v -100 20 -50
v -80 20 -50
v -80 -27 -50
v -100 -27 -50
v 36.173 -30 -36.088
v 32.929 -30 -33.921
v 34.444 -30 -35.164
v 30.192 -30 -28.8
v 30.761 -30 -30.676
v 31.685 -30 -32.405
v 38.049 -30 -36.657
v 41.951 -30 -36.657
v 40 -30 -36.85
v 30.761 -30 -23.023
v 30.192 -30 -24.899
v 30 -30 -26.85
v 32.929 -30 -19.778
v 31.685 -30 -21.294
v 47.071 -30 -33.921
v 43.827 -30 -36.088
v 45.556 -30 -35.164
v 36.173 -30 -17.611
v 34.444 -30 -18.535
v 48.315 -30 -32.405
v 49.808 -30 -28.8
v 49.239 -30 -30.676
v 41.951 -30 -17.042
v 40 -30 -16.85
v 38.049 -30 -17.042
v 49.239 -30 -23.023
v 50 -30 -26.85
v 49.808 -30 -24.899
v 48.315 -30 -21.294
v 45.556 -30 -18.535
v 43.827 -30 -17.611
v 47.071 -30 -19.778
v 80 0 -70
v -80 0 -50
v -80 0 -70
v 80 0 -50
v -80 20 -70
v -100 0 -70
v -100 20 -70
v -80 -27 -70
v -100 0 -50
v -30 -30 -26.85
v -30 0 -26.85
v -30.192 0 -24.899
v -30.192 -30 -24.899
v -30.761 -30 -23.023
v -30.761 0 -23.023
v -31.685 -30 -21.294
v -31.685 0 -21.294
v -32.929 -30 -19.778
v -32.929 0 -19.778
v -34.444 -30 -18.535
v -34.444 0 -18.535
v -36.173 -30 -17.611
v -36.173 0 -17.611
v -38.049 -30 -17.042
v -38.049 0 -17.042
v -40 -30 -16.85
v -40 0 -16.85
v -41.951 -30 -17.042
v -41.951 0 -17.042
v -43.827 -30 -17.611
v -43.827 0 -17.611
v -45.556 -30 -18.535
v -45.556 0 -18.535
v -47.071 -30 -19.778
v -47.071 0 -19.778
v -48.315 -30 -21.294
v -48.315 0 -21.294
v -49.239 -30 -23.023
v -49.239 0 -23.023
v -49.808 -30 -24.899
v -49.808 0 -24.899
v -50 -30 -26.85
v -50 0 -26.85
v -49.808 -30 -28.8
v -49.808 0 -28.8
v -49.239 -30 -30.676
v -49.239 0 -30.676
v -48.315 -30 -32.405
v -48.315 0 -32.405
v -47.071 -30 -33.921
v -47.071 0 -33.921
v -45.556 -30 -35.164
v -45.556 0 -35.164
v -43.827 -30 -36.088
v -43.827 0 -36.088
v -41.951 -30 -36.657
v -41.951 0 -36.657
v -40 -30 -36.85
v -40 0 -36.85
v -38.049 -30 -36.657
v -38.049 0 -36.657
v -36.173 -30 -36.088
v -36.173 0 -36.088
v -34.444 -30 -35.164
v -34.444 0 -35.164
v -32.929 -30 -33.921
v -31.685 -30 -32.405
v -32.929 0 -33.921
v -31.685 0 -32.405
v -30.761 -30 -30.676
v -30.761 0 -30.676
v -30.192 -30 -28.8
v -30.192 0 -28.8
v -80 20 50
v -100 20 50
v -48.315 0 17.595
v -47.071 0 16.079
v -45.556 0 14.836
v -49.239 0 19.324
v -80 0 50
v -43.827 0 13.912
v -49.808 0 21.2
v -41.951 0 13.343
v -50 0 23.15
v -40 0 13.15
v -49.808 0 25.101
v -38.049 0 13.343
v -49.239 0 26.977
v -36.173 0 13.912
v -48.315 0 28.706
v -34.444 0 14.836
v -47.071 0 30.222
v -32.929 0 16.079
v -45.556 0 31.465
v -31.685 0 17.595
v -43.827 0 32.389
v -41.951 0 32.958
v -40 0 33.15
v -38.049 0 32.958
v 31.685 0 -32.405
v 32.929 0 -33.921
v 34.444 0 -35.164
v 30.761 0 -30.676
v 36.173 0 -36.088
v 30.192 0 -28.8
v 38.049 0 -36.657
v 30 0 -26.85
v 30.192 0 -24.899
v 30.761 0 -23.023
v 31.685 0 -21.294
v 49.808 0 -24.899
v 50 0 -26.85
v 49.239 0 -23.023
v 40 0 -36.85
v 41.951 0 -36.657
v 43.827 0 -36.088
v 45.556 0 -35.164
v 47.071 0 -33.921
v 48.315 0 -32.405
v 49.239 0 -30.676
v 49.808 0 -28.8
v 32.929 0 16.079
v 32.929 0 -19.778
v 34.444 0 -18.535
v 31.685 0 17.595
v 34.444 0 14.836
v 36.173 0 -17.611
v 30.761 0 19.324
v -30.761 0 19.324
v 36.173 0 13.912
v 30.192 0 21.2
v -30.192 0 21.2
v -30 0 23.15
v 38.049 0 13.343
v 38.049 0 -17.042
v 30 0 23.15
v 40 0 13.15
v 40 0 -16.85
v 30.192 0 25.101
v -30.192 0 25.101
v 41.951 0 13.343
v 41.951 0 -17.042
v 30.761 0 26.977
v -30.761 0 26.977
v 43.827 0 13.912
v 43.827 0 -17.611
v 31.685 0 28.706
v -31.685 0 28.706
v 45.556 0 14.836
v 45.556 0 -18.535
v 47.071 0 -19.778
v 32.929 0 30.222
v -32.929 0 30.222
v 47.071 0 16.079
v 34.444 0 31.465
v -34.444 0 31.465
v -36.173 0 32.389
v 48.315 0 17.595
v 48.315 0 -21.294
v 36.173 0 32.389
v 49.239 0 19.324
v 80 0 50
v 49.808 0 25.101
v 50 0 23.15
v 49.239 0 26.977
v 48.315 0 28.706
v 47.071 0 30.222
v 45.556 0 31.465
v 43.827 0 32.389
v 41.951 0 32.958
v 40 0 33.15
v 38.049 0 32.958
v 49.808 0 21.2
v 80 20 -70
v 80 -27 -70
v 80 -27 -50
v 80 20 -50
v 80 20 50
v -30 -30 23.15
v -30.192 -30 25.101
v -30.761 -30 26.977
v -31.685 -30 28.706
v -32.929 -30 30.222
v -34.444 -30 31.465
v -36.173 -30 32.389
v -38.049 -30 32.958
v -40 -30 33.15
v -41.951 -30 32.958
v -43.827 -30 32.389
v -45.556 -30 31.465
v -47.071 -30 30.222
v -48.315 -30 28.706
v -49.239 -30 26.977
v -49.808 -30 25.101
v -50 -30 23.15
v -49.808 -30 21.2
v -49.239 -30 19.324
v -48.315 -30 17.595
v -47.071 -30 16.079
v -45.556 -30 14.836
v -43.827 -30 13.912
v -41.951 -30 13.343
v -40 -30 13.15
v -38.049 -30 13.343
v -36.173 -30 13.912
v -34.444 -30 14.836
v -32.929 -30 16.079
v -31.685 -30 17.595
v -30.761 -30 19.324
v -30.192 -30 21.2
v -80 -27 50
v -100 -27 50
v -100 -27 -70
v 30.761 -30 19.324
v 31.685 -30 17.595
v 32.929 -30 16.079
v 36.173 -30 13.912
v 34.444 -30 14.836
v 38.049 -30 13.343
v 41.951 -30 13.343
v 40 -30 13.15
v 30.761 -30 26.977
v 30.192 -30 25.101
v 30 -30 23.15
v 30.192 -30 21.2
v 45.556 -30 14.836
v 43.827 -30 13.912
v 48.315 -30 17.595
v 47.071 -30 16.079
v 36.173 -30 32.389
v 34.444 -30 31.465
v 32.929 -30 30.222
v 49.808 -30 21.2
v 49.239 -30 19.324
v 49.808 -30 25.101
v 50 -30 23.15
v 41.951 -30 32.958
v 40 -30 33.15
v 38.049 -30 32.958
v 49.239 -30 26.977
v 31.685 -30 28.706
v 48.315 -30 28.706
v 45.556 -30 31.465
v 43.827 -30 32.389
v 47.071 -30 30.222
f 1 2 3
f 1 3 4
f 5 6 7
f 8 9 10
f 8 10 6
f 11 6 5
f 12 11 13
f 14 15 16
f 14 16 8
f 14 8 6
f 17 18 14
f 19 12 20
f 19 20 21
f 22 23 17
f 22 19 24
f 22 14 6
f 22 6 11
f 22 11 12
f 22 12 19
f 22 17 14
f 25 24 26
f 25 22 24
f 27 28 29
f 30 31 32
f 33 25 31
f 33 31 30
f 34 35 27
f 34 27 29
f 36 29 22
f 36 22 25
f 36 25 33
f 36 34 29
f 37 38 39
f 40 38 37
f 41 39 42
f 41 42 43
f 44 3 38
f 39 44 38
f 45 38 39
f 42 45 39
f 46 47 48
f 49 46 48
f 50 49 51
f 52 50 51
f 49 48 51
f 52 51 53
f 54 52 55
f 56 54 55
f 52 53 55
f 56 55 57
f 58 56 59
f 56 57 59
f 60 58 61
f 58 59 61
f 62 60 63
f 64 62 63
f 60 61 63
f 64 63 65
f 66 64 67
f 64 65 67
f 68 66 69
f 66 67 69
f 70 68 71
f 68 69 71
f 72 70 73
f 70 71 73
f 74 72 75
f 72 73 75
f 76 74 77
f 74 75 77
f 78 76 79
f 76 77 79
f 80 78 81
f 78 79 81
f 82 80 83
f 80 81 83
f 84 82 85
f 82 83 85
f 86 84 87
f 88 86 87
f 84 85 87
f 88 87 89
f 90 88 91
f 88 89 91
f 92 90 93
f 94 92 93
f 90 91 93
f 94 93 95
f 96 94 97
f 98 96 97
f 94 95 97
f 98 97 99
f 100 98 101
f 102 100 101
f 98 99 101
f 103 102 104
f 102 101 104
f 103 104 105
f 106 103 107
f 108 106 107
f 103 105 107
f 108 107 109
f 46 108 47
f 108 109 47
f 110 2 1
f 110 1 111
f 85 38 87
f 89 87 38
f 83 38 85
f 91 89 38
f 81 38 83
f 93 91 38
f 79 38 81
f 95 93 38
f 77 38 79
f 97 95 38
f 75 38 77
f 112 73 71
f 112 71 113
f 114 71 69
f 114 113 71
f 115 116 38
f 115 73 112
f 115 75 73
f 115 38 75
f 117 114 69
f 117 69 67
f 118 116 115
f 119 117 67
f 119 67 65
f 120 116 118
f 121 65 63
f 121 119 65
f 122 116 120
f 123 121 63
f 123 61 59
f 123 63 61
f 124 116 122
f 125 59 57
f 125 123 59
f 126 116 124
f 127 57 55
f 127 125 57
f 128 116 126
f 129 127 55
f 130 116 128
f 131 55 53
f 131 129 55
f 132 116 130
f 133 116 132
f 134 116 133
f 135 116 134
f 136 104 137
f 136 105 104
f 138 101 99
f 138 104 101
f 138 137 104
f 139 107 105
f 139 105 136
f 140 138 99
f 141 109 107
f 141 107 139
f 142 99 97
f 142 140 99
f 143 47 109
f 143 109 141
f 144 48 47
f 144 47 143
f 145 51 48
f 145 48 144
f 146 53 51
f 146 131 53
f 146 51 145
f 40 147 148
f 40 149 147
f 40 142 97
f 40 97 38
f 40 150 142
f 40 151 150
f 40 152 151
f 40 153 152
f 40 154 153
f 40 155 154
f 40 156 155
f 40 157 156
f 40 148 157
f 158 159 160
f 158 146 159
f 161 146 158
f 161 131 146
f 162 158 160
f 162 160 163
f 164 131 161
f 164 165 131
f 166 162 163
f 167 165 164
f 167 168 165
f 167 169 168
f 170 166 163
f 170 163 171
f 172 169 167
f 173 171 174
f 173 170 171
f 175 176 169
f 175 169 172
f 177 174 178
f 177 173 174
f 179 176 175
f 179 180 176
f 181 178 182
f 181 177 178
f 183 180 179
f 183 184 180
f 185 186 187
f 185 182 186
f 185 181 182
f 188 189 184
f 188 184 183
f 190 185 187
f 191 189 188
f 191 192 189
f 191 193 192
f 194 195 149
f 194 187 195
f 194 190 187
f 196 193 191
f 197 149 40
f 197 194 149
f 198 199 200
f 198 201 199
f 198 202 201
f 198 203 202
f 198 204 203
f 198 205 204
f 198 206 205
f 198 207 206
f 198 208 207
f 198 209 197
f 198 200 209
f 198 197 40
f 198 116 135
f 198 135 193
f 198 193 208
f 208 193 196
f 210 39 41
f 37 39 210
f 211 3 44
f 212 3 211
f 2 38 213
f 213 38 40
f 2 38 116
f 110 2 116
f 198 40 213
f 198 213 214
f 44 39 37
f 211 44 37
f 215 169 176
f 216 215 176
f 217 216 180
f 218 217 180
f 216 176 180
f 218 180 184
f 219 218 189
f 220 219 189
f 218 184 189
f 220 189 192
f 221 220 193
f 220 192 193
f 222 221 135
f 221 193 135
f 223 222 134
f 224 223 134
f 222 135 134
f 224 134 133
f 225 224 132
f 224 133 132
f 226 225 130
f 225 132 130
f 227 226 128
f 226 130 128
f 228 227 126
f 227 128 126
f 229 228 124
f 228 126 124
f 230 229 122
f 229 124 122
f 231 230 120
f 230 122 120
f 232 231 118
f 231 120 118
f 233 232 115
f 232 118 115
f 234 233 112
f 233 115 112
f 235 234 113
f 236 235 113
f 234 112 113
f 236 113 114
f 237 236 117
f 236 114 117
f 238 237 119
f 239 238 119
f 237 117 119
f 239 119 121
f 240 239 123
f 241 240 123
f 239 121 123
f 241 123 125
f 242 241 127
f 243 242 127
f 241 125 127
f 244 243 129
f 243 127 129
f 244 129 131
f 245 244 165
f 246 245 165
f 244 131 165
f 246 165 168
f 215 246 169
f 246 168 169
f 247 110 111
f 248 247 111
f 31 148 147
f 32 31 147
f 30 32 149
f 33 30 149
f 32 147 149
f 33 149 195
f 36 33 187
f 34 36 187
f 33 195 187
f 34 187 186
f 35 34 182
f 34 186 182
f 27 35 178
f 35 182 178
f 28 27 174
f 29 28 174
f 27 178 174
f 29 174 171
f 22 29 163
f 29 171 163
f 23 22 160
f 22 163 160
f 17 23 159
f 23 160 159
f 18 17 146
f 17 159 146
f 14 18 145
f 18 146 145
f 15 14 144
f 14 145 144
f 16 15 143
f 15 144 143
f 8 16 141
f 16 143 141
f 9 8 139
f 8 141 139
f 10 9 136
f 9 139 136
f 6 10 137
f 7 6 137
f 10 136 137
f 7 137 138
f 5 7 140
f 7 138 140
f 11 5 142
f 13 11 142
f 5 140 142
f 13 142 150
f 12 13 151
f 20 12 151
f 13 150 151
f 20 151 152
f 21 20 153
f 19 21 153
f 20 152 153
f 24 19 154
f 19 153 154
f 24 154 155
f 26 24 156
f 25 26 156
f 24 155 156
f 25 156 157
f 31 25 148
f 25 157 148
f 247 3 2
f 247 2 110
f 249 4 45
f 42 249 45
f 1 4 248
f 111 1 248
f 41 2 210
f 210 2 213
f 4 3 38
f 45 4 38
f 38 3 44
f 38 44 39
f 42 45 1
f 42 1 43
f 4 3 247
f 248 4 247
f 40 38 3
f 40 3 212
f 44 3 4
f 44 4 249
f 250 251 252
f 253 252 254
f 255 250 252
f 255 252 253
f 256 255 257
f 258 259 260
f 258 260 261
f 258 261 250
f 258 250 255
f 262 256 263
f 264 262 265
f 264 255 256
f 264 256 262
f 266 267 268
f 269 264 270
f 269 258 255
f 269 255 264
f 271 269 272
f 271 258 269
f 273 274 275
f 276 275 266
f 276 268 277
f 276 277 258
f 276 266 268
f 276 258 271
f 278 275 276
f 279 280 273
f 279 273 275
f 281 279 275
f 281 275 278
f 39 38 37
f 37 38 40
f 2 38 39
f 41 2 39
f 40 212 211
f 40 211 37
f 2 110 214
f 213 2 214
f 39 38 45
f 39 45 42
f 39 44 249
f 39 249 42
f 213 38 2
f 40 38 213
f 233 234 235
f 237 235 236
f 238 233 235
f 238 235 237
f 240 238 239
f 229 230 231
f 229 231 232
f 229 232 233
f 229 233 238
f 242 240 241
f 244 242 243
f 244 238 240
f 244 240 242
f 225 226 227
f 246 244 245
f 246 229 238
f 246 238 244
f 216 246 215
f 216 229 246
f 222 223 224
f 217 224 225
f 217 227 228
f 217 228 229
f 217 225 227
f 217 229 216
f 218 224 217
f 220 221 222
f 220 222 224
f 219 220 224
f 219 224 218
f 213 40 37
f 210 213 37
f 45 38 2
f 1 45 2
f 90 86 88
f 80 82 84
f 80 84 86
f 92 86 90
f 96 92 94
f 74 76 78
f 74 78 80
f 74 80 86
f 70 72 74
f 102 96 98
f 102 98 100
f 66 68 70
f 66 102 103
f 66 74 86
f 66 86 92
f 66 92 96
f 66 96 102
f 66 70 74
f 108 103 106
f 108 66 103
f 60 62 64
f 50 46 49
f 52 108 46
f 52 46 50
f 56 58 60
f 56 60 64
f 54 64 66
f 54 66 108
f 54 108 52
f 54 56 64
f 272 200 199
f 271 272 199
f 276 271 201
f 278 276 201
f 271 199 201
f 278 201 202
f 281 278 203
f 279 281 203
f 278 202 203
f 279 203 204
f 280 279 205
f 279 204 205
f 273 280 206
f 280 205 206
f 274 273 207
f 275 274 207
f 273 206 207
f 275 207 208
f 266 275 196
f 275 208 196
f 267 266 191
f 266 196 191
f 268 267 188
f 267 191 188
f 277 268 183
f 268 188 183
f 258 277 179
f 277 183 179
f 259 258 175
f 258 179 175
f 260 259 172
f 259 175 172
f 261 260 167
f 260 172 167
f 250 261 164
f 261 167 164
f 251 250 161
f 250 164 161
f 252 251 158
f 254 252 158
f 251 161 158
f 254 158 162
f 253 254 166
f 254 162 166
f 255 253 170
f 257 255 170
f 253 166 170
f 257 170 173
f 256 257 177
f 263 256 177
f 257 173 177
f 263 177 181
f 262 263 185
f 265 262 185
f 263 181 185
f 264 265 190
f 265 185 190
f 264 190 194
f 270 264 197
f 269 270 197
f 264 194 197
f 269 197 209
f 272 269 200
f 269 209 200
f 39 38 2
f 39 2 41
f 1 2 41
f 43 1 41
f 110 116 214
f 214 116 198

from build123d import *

# Parameters (mm, degrees)
F0_W      = 160
F0_H      = 100
F1_DEPTH  = 20
F3_W      = 27
F3_H      = 100
F4_DEPTH  = 20
F5_DEPTH  = 20
F6_R      = 10
F7_DEPTH  = 30
F9_W      = 160
F9_H      = 27
F10_DEPTH = 20
F11_DEPTH = 20
F12_DEPTH = 20
F13_DEPTH = 20


with BuildPart() as f1:
    # F0 (on Front) → F1 (new body)
    with BuildSketch(Plane.XZ):
        Rectangle(F0_W, F0_H)
    extrude(amount=-F1_DEPTH)

    # F6 (on face) → F7 (join)
    with BuildSketch(Plane.XZ):
        with Locations((-40, -26.8495120108)):
            Circle(F6_R)
        with Locations((-40, 23.1504879892)):
            Circle(F6_R)
        with Locations((40, -26.8495120108)):
            Circle(F6_R)
        with Locations((40, 23.1504879892)):
            Circle(F6_R)
    extrude(amount=F7_DEPTH)


with BuildPart() as f4:
    # F3 (on offset) → F4 (new body)
    with BuildSketch(Plane.YZ.offset(-80)):
        with Locations((-13.5, 0)):
            Rectangle(F3_W, F3_H)
    extrude(amount=-F4_DEPTH)

    # F5 (add): faces of the model
    f5_faces = [f4.faces().sort_by_distance(p)[0] for p in [
        (-90, -27, 0),
        (-90, 0, 0),
    ]]
    extrude(f5_faces, amount=-F5_DEPTH, dir=(0, -1, 0))


with BuildPart() as f10:
    # F9 (on offset) → F10 (new body)
    with BuildSketch(Plane.XY.offset(-50)):
        with Locations((0, -13.5)):
            Rectangle(F9_W, F9_H)
    extrude(amount=-F10_DEPTH)


with BuildPart() as f11:
    # F11 (new, through all): a face of the model
    f11_faces = [f10.part.faces().sort_by_distance(p)[0] for p in [
        (0, 0, -60),
    ]]
    extrude(f11_faces, amount=F11_DEPTH)


with BuildPart() as f12:
    # F12 (new, through all): a face of the model
    f12_faces = [f10.part.faces().sort_by_distance(p)[0] for p in [
        (-80, -13.5, -60),
    ]]
    extrude(f12_faces, amount=F12_DEPTH)


with BuildPart() as f13:
    # F13 (new, through all): a face of the model
    f13_faces = [f11.part.faces().sort_by_distance(p)[0] for p in [
        (-80, 10, -60),
    ]]
    extrude(f13_faces, amount=F13_DEPTH)


solid = Compound([f1.part, f4.part, f10.part, f11.part, f12.part, f13.part])
